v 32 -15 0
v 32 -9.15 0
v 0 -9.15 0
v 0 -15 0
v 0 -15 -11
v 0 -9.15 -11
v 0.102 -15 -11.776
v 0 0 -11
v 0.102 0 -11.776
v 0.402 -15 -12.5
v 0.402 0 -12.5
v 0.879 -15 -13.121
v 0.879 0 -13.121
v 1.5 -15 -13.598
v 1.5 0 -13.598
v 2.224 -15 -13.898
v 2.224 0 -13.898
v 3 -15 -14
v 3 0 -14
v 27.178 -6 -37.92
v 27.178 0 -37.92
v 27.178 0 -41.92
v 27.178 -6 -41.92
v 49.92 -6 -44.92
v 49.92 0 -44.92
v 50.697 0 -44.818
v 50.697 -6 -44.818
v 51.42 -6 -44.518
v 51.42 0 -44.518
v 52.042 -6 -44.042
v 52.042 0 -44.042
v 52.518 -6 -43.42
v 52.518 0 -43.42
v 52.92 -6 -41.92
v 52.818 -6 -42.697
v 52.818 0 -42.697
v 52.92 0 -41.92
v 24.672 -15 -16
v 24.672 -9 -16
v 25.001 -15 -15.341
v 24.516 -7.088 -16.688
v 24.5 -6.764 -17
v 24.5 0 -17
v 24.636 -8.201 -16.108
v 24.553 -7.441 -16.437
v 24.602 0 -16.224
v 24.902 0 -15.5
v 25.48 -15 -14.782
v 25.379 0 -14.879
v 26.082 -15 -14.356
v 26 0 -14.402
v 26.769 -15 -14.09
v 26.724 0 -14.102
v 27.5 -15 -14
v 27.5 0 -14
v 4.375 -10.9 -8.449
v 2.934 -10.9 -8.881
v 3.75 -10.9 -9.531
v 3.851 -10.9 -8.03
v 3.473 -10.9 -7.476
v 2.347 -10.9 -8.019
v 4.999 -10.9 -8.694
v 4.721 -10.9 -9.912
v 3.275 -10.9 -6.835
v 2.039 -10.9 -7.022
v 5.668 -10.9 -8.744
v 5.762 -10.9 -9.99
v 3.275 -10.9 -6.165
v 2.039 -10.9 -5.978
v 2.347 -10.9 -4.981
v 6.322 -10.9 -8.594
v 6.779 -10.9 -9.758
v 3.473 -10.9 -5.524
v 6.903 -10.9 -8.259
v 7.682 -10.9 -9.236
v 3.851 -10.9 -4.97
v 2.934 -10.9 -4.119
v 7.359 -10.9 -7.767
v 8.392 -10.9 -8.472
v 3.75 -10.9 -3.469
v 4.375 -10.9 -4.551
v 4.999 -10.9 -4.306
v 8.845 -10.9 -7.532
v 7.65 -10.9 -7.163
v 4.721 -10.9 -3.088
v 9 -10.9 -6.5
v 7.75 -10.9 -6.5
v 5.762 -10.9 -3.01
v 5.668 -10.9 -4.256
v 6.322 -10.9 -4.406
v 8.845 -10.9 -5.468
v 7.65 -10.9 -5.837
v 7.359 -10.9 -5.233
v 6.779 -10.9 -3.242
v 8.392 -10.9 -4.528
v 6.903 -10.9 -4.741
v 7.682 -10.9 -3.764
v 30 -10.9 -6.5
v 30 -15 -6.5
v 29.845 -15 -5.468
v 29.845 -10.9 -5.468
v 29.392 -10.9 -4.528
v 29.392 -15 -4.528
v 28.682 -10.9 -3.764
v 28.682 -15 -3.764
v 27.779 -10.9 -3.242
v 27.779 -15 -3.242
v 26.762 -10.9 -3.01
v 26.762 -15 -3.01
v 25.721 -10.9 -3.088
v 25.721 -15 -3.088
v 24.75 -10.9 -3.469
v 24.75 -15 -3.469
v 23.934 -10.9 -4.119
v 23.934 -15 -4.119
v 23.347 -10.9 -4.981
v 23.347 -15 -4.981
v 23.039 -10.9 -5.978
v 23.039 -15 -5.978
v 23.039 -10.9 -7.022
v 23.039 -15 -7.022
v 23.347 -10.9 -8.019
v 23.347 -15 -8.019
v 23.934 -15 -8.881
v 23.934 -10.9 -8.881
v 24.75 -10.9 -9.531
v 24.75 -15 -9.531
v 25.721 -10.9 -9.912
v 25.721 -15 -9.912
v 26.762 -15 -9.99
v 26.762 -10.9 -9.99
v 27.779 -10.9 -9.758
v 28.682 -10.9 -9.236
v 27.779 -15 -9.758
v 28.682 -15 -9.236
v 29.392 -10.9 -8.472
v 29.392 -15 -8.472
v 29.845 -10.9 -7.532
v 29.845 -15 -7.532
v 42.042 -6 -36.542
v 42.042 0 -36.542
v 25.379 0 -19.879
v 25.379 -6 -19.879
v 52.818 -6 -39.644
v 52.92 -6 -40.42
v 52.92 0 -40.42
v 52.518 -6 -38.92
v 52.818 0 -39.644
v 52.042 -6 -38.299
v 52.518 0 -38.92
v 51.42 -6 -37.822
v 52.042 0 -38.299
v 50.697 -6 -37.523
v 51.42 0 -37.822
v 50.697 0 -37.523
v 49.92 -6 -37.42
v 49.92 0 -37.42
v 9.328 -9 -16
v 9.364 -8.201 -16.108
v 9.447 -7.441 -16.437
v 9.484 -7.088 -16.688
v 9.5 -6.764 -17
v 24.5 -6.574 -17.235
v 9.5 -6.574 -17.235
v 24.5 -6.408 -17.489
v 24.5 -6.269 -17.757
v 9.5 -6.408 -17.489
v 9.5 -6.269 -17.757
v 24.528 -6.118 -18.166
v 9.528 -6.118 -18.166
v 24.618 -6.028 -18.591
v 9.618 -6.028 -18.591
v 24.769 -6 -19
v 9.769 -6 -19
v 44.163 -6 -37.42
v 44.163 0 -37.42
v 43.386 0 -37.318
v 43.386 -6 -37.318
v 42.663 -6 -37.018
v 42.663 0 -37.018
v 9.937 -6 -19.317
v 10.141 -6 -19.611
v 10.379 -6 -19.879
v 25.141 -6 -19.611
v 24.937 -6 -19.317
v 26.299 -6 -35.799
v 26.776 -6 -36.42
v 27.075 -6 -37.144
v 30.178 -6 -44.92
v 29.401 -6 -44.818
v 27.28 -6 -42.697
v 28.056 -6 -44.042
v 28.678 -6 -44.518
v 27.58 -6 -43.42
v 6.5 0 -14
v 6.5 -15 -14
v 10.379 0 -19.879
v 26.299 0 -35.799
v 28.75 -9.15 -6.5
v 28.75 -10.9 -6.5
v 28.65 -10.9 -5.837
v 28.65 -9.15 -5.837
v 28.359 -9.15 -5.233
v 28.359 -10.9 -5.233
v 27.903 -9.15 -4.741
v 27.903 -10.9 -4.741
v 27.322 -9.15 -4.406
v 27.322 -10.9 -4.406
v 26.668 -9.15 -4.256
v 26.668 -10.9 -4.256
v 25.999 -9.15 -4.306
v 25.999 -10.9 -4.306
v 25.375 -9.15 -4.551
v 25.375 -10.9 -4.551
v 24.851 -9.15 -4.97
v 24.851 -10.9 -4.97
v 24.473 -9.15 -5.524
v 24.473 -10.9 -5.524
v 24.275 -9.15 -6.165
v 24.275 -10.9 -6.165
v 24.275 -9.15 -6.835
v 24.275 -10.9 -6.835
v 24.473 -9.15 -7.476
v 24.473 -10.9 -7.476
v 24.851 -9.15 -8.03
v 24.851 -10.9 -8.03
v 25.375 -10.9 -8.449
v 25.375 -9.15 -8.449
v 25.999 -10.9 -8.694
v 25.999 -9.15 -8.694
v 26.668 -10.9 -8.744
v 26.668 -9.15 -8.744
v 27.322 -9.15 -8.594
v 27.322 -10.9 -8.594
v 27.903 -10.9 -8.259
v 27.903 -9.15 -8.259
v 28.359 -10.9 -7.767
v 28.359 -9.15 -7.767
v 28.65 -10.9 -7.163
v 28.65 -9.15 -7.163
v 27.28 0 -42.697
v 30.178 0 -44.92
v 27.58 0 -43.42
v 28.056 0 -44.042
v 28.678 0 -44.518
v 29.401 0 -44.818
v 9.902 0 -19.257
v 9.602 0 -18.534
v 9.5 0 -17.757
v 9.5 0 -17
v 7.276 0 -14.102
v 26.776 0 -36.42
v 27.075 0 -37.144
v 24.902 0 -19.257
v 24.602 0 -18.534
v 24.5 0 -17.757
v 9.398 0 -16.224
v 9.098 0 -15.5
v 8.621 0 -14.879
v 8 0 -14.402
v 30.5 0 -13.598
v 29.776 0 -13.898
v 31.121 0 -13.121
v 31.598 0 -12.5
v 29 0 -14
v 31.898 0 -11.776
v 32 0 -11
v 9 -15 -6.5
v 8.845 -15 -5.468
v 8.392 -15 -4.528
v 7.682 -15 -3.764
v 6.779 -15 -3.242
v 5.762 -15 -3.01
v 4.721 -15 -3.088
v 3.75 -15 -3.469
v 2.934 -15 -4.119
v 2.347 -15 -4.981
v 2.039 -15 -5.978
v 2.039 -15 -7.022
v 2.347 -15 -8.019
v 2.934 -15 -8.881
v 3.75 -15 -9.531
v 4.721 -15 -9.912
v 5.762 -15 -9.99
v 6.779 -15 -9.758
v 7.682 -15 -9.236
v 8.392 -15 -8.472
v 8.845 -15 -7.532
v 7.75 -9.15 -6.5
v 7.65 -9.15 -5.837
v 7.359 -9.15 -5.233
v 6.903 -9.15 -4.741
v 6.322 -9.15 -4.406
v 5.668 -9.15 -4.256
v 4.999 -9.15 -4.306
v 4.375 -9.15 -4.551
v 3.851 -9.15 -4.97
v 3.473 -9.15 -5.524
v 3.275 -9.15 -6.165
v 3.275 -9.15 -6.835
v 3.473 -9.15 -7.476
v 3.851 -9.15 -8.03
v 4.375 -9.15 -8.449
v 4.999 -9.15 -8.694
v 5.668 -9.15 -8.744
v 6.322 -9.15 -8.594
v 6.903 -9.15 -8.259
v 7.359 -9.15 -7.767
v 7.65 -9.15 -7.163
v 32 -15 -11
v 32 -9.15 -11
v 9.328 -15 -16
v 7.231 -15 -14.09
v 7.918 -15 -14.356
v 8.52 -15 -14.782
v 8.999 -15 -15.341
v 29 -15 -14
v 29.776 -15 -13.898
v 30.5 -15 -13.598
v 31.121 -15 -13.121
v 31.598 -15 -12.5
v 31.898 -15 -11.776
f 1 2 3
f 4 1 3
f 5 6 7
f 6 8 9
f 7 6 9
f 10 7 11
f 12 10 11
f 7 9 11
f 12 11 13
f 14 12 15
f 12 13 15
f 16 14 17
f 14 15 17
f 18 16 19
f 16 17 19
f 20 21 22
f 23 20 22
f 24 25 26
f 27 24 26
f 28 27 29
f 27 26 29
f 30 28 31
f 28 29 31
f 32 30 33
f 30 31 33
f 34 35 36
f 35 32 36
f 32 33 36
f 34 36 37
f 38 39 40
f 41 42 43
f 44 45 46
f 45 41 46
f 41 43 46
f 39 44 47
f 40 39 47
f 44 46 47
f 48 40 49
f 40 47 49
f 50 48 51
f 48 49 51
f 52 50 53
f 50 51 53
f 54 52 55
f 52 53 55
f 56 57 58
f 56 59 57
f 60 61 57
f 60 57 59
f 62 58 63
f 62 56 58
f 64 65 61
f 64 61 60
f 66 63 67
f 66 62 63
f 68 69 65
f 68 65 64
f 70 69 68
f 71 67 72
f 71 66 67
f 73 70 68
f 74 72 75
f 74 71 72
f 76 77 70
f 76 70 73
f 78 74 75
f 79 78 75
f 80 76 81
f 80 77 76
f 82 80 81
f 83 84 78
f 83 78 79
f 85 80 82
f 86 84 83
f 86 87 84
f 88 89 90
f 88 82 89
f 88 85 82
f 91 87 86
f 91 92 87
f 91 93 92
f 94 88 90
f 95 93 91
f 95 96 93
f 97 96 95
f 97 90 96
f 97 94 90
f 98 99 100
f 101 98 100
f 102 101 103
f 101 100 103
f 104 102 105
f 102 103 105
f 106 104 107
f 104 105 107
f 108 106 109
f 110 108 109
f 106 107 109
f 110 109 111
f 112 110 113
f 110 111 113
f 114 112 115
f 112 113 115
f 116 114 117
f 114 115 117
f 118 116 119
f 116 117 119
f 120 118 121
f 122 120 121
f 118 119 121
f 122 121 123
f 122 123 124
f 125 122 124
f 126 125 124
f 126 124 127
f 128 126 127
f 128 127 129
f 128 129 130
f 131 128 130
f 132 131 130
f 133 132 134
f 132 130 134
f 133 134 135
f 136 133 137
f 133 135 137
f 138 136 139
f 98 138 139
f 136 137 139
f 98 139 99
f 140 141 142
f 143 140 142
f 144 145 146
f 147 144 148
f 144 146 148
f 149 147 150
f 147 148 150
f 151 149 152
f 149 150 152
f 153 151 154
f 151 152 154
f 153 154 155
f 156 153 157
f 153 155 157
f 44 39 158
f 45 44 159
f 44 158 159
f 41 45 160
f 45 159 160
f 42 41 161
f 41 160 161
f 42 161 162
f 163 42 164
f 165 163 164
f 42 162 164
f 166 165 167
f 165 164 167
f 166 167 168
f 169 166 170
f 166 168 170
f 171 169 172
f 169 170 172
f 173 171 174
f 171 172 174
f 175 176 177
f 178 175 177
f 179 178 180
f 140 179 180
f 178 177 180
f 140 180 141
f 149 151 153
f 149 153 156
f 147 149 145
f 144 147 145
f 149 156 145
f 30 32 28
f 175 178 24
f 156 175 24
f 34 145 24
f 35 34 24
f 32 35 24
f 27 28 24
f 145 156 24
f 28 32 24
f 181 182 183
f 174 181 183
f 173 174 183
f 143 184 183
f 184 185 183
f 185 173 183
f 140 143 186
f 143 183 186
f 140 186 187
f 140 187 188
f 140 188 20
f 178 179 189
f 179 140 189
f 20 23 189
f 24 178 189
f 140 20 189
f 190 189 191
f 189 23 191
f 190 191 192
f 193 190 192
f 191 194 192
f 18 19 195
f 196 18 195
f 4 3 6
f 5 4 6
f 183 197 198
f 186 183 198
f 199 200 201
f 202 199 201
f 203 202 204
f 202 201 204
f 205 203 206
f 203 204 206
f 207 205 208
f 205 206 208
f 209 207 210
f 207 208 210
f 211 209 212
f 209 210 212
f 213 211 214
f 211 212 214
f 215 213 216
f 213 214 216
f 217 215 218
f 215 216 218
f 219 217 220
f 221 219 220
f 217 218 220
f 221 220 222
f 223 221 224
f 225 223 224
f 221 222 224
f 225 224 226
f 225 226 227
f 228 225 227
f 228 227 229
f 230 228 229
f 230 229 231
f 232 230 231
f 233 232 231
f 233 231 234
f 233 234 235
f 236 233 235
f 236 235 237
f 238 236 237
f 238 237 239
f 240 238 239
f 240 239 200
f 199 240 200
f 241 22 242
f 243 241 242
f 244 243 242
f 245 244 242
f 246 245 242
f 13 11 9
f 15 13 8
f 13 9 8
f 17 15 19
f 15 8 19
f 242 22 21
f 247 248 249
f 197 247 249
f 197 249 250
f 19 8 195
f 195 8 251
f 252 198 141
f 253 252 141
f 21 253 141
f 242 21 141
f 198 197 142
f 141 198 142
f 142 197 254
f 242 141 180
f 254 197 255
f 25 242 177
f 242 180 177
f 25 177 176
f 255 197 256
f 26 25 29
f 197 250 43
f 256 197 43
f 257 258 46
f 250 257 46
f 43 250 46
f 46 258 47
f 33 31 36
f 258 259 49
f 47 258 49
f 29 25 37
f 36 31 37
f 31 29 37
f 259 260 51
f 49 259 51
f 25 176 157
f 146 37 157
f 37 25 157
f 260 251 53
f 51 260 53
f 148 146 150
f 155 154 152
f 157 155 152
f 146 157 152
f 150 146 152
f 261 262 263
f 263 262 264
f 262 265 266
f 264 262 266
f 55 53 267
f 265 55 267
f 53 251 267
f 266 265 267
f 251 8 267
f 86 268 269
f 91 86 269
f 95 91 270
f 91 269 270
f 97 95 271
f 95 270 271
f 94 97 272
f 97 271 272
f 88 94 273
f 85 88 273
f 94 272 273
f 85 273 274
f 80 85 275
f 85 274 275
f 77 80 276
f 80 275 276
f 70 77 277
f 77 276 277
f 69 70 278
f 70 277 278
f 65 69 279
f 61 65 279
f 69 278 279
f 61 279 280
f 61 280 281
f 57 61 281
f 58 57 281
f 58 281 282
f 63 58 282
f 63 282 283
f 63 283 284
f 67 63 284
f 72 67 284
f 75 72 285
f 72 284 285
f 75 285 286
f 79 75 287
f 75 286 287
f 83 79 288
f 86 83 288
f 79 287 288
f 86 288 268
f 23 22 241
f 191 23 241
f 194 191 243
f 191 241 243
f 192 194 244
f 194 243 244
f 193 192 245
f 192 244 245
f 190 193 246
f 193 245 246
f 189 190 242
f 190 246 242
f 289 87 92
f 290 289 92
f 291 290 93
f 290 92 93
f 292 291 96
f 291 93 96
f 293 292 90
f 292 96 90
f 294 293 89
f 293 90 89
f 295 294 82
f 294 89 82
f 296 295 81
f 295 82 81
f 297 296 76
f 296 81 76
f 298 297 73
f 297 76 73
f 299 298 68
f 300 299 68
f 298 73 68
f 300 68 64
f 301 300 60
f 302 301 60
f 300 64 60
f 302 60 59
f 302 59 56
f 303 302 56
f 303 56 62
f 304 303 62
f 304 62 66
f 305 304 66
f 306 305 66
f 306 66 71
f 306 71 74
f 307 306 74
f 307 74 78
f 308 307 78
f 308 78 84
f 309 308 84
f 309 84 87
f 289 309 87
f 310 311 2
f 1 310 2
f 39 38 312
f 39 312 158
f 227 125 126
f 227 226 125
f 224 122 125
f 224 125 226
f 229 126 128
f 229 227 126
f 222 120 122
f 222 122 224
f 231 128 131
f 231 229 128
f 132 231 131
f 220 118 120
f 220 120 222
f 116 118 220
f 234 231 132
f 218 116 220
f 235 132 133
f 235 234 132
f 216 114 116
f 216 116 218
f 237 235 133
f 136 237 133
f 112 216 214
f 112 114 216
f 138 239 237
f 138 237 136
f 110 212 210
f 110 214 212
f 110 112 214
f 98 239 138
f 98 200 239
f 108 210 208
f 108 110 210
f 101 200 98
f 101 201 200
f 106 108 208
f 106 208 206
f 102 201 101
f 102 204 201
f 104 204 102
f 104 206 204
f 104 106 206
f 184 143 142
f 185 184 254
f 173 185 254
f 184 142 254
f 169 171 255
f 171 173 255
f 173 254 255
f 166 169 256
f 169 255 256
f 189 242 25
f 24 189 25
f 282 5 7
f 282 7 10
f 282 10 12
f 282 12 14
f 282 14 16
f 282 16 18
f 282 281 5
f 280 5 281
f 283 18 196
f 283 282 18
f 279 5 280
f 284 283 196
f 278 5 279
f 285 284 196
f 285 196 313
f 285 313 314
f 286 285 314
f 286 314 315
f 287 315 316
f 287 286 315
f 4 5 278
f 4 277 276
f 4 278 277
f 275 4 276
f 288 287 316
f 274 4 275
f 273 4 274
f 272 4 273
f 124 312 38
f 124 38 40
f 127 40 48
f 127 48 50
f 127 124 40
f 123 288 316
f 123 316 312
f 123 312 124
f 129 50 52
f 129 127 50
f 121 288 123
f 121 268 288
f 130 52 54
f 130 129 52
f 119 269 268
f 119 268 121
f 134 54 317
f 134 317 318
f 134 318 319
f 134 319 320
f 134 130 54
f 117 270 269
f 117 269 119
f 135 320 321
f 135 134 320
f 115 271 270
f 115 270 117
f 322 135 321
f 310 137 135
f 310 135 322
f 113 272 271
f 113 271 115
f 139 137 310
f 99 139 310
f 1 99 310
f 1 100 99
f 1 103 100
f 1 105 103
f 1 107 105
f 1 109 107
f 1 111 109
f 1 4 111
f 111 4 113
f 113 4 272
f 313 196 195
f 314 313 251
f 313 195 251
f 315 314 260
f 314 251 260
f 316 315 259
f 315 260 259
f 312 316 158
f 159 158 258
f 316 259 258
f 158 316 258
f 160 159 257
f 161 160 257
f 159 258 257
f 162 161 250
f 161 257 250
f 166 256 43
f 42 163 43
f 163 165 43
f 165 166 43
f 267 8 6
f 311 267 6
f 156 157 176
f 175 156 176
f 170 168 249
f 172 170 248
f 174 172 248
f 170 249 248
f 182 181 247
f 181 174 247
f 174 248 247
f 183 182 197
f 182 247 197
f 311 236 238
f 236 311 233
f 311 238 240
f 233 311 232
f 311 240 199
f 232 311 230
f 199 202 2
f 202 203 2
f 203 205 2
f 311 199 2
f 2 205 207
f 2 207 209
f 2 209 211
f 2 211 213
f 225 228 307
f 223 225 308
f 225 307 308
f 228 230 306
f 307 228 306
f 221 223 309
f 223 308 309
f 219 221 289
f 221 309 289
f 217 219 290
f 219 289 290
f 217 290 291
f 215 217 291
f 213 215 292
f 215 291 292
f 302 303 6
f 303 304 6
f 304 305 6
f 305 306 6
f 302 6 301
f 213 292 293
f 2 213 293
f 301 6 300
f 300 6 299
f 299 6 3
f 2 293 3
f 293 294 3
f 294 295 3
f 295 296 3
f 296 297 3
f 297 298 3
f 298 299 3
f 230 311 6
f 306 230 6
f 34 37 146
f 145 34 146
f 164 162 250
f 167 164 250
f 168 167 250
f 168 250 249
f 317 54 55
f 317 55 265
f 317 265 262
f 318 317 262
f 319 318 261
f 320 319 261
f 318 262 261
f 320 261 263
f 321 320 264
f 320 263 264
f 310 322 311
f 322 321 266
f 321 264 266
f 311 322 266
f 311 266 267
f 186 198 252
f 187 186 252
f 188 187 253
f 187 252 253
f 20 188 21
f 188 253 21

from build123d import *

# Parameters (mm, degrees)
F1_DEPTH = 15
F2_R     = 3.5
F3_DEPTH = 4.1
F4_R     = 2.25
F5_DEPTH = 25
F6_W     = 9.15
F6_H     = 11
F7_DEPTH = 52.92131


with BuildPart() as f1:
    # F0 (on Front) → F1 (new body)
    with BuildSketch(Plane.XZ):
        with BuildLine():
            Line((32, 0), (0, 0))
            Line((0, 0), (0, -11))
            ThreePointArc((0, -11), (0.87868, -13.12132), (3, -14))
            Line((3, -14), (6.5, -14))
            ThreePointArc((6.5, -14), (8.62132, -14.87868), (9.5, -17))
            Line((9.5, -17), (9.5, -17.757359))
            ThreePointArc((9.5, -17.757359), (9.728361, -18.90541), (10.37868, -19.87868))
            Line((10.37868, -19.87868), (26.29899, -35.79899))
            ThreePointArc((26.29899, -35.79899), (26.949308, -36.77226), (27.17767, -37.92031))
            Line((27.17767, -37.92031), (27.17767, -41.92031))
            ThreePointArc((27.17767, -41.92031), (28.056349, -44.041631), (30.17767, -44.92031))
            Line((30.17767, -44.92031), (49.92031, -44.92031))
            ThreePointArc((49.92031, -44.92031), (52.041631, -44.041631), (52.92031, -41.92031))
            Line((52.92031, -41.92031), (52.92031, -40.42031))
            ThreePointArc((52.92031, -40.42031), (52.041631, -38.29899), (49.92031, -37.42031))
            Line((49.92031, -37.42031), (44.162951, -37.42031))
            ThreePointArc((44.162951, -37.42031), (43.014901, -37.191949), (42.041631, -36.541631))
            Line((42.041631, -36.541631), (25.37868, -19.87868))
            ThreePointArc((25.37868, -19.87868), (24.728361, -18.90541), (24.5, -17.757359))
            Line((24.5, -17.757359), (24.5, -17))
            ThreePointArc((24.5, -17), (25.37868, -14.87868), (27.5, -14))
            Line((27.5, -14), (29, -14))
            ThreePointArc((29, -14), (31.12132, -13.12132), (32, -11))
            Line((32, -11), (32, 0))
        make_face()
    extrude(amount=F1_DEPTH)

    # F2 (on face) → F3 (cut)
    with BuildSketch(Plane.XZ.offset(15)):
        with Locations((26.5, -6.5)):
            Circle(F2_R)
        with Locations((5.5, -6.5)):
            Circle(F2_R)
    extrude(amount=-F3_DEPTH, mode=Mode.SUBTRACT)

    # F4 (on face) → F5 (cut)
    with BuildSketch(Plane.XZ.offset(15)):
        with Locations((5.5, -6.5)):
            Circle(F4_R)
        with Locations((26.5, -6.5)):
            Circle(F4_R)
    extrude(amount=-F5_DEPTH, mode=Mode.SUBTRACT)

    # F6 (on face) → F7 (cut, through all)
    with BuildSketch(Plane(origin=(0, 0, 0), x_dir=(0, -1, 0), z_dir=(-1, 0, 0))):
        with Locations((4.575, -5.5)):
            Rectangle(F6_W, F6_H)
        with BuildLine():
            ThreePointArc((6, -45), (6.87868, -47.12132), (9, -48))
            Line((9, -48), (15, -48))
            Line((15, -48), (15, -16))
            Line((15, -16), (9, -16))
            ThreePointArc((9, -16), (6.87868, -16.87868), (6, -19))
            Line((6, -19), (6, -45))
        make_face()
    extrude(amount=-F7_DEPTH, mode=Mode.SUBTRACT)


solid = f1.part
